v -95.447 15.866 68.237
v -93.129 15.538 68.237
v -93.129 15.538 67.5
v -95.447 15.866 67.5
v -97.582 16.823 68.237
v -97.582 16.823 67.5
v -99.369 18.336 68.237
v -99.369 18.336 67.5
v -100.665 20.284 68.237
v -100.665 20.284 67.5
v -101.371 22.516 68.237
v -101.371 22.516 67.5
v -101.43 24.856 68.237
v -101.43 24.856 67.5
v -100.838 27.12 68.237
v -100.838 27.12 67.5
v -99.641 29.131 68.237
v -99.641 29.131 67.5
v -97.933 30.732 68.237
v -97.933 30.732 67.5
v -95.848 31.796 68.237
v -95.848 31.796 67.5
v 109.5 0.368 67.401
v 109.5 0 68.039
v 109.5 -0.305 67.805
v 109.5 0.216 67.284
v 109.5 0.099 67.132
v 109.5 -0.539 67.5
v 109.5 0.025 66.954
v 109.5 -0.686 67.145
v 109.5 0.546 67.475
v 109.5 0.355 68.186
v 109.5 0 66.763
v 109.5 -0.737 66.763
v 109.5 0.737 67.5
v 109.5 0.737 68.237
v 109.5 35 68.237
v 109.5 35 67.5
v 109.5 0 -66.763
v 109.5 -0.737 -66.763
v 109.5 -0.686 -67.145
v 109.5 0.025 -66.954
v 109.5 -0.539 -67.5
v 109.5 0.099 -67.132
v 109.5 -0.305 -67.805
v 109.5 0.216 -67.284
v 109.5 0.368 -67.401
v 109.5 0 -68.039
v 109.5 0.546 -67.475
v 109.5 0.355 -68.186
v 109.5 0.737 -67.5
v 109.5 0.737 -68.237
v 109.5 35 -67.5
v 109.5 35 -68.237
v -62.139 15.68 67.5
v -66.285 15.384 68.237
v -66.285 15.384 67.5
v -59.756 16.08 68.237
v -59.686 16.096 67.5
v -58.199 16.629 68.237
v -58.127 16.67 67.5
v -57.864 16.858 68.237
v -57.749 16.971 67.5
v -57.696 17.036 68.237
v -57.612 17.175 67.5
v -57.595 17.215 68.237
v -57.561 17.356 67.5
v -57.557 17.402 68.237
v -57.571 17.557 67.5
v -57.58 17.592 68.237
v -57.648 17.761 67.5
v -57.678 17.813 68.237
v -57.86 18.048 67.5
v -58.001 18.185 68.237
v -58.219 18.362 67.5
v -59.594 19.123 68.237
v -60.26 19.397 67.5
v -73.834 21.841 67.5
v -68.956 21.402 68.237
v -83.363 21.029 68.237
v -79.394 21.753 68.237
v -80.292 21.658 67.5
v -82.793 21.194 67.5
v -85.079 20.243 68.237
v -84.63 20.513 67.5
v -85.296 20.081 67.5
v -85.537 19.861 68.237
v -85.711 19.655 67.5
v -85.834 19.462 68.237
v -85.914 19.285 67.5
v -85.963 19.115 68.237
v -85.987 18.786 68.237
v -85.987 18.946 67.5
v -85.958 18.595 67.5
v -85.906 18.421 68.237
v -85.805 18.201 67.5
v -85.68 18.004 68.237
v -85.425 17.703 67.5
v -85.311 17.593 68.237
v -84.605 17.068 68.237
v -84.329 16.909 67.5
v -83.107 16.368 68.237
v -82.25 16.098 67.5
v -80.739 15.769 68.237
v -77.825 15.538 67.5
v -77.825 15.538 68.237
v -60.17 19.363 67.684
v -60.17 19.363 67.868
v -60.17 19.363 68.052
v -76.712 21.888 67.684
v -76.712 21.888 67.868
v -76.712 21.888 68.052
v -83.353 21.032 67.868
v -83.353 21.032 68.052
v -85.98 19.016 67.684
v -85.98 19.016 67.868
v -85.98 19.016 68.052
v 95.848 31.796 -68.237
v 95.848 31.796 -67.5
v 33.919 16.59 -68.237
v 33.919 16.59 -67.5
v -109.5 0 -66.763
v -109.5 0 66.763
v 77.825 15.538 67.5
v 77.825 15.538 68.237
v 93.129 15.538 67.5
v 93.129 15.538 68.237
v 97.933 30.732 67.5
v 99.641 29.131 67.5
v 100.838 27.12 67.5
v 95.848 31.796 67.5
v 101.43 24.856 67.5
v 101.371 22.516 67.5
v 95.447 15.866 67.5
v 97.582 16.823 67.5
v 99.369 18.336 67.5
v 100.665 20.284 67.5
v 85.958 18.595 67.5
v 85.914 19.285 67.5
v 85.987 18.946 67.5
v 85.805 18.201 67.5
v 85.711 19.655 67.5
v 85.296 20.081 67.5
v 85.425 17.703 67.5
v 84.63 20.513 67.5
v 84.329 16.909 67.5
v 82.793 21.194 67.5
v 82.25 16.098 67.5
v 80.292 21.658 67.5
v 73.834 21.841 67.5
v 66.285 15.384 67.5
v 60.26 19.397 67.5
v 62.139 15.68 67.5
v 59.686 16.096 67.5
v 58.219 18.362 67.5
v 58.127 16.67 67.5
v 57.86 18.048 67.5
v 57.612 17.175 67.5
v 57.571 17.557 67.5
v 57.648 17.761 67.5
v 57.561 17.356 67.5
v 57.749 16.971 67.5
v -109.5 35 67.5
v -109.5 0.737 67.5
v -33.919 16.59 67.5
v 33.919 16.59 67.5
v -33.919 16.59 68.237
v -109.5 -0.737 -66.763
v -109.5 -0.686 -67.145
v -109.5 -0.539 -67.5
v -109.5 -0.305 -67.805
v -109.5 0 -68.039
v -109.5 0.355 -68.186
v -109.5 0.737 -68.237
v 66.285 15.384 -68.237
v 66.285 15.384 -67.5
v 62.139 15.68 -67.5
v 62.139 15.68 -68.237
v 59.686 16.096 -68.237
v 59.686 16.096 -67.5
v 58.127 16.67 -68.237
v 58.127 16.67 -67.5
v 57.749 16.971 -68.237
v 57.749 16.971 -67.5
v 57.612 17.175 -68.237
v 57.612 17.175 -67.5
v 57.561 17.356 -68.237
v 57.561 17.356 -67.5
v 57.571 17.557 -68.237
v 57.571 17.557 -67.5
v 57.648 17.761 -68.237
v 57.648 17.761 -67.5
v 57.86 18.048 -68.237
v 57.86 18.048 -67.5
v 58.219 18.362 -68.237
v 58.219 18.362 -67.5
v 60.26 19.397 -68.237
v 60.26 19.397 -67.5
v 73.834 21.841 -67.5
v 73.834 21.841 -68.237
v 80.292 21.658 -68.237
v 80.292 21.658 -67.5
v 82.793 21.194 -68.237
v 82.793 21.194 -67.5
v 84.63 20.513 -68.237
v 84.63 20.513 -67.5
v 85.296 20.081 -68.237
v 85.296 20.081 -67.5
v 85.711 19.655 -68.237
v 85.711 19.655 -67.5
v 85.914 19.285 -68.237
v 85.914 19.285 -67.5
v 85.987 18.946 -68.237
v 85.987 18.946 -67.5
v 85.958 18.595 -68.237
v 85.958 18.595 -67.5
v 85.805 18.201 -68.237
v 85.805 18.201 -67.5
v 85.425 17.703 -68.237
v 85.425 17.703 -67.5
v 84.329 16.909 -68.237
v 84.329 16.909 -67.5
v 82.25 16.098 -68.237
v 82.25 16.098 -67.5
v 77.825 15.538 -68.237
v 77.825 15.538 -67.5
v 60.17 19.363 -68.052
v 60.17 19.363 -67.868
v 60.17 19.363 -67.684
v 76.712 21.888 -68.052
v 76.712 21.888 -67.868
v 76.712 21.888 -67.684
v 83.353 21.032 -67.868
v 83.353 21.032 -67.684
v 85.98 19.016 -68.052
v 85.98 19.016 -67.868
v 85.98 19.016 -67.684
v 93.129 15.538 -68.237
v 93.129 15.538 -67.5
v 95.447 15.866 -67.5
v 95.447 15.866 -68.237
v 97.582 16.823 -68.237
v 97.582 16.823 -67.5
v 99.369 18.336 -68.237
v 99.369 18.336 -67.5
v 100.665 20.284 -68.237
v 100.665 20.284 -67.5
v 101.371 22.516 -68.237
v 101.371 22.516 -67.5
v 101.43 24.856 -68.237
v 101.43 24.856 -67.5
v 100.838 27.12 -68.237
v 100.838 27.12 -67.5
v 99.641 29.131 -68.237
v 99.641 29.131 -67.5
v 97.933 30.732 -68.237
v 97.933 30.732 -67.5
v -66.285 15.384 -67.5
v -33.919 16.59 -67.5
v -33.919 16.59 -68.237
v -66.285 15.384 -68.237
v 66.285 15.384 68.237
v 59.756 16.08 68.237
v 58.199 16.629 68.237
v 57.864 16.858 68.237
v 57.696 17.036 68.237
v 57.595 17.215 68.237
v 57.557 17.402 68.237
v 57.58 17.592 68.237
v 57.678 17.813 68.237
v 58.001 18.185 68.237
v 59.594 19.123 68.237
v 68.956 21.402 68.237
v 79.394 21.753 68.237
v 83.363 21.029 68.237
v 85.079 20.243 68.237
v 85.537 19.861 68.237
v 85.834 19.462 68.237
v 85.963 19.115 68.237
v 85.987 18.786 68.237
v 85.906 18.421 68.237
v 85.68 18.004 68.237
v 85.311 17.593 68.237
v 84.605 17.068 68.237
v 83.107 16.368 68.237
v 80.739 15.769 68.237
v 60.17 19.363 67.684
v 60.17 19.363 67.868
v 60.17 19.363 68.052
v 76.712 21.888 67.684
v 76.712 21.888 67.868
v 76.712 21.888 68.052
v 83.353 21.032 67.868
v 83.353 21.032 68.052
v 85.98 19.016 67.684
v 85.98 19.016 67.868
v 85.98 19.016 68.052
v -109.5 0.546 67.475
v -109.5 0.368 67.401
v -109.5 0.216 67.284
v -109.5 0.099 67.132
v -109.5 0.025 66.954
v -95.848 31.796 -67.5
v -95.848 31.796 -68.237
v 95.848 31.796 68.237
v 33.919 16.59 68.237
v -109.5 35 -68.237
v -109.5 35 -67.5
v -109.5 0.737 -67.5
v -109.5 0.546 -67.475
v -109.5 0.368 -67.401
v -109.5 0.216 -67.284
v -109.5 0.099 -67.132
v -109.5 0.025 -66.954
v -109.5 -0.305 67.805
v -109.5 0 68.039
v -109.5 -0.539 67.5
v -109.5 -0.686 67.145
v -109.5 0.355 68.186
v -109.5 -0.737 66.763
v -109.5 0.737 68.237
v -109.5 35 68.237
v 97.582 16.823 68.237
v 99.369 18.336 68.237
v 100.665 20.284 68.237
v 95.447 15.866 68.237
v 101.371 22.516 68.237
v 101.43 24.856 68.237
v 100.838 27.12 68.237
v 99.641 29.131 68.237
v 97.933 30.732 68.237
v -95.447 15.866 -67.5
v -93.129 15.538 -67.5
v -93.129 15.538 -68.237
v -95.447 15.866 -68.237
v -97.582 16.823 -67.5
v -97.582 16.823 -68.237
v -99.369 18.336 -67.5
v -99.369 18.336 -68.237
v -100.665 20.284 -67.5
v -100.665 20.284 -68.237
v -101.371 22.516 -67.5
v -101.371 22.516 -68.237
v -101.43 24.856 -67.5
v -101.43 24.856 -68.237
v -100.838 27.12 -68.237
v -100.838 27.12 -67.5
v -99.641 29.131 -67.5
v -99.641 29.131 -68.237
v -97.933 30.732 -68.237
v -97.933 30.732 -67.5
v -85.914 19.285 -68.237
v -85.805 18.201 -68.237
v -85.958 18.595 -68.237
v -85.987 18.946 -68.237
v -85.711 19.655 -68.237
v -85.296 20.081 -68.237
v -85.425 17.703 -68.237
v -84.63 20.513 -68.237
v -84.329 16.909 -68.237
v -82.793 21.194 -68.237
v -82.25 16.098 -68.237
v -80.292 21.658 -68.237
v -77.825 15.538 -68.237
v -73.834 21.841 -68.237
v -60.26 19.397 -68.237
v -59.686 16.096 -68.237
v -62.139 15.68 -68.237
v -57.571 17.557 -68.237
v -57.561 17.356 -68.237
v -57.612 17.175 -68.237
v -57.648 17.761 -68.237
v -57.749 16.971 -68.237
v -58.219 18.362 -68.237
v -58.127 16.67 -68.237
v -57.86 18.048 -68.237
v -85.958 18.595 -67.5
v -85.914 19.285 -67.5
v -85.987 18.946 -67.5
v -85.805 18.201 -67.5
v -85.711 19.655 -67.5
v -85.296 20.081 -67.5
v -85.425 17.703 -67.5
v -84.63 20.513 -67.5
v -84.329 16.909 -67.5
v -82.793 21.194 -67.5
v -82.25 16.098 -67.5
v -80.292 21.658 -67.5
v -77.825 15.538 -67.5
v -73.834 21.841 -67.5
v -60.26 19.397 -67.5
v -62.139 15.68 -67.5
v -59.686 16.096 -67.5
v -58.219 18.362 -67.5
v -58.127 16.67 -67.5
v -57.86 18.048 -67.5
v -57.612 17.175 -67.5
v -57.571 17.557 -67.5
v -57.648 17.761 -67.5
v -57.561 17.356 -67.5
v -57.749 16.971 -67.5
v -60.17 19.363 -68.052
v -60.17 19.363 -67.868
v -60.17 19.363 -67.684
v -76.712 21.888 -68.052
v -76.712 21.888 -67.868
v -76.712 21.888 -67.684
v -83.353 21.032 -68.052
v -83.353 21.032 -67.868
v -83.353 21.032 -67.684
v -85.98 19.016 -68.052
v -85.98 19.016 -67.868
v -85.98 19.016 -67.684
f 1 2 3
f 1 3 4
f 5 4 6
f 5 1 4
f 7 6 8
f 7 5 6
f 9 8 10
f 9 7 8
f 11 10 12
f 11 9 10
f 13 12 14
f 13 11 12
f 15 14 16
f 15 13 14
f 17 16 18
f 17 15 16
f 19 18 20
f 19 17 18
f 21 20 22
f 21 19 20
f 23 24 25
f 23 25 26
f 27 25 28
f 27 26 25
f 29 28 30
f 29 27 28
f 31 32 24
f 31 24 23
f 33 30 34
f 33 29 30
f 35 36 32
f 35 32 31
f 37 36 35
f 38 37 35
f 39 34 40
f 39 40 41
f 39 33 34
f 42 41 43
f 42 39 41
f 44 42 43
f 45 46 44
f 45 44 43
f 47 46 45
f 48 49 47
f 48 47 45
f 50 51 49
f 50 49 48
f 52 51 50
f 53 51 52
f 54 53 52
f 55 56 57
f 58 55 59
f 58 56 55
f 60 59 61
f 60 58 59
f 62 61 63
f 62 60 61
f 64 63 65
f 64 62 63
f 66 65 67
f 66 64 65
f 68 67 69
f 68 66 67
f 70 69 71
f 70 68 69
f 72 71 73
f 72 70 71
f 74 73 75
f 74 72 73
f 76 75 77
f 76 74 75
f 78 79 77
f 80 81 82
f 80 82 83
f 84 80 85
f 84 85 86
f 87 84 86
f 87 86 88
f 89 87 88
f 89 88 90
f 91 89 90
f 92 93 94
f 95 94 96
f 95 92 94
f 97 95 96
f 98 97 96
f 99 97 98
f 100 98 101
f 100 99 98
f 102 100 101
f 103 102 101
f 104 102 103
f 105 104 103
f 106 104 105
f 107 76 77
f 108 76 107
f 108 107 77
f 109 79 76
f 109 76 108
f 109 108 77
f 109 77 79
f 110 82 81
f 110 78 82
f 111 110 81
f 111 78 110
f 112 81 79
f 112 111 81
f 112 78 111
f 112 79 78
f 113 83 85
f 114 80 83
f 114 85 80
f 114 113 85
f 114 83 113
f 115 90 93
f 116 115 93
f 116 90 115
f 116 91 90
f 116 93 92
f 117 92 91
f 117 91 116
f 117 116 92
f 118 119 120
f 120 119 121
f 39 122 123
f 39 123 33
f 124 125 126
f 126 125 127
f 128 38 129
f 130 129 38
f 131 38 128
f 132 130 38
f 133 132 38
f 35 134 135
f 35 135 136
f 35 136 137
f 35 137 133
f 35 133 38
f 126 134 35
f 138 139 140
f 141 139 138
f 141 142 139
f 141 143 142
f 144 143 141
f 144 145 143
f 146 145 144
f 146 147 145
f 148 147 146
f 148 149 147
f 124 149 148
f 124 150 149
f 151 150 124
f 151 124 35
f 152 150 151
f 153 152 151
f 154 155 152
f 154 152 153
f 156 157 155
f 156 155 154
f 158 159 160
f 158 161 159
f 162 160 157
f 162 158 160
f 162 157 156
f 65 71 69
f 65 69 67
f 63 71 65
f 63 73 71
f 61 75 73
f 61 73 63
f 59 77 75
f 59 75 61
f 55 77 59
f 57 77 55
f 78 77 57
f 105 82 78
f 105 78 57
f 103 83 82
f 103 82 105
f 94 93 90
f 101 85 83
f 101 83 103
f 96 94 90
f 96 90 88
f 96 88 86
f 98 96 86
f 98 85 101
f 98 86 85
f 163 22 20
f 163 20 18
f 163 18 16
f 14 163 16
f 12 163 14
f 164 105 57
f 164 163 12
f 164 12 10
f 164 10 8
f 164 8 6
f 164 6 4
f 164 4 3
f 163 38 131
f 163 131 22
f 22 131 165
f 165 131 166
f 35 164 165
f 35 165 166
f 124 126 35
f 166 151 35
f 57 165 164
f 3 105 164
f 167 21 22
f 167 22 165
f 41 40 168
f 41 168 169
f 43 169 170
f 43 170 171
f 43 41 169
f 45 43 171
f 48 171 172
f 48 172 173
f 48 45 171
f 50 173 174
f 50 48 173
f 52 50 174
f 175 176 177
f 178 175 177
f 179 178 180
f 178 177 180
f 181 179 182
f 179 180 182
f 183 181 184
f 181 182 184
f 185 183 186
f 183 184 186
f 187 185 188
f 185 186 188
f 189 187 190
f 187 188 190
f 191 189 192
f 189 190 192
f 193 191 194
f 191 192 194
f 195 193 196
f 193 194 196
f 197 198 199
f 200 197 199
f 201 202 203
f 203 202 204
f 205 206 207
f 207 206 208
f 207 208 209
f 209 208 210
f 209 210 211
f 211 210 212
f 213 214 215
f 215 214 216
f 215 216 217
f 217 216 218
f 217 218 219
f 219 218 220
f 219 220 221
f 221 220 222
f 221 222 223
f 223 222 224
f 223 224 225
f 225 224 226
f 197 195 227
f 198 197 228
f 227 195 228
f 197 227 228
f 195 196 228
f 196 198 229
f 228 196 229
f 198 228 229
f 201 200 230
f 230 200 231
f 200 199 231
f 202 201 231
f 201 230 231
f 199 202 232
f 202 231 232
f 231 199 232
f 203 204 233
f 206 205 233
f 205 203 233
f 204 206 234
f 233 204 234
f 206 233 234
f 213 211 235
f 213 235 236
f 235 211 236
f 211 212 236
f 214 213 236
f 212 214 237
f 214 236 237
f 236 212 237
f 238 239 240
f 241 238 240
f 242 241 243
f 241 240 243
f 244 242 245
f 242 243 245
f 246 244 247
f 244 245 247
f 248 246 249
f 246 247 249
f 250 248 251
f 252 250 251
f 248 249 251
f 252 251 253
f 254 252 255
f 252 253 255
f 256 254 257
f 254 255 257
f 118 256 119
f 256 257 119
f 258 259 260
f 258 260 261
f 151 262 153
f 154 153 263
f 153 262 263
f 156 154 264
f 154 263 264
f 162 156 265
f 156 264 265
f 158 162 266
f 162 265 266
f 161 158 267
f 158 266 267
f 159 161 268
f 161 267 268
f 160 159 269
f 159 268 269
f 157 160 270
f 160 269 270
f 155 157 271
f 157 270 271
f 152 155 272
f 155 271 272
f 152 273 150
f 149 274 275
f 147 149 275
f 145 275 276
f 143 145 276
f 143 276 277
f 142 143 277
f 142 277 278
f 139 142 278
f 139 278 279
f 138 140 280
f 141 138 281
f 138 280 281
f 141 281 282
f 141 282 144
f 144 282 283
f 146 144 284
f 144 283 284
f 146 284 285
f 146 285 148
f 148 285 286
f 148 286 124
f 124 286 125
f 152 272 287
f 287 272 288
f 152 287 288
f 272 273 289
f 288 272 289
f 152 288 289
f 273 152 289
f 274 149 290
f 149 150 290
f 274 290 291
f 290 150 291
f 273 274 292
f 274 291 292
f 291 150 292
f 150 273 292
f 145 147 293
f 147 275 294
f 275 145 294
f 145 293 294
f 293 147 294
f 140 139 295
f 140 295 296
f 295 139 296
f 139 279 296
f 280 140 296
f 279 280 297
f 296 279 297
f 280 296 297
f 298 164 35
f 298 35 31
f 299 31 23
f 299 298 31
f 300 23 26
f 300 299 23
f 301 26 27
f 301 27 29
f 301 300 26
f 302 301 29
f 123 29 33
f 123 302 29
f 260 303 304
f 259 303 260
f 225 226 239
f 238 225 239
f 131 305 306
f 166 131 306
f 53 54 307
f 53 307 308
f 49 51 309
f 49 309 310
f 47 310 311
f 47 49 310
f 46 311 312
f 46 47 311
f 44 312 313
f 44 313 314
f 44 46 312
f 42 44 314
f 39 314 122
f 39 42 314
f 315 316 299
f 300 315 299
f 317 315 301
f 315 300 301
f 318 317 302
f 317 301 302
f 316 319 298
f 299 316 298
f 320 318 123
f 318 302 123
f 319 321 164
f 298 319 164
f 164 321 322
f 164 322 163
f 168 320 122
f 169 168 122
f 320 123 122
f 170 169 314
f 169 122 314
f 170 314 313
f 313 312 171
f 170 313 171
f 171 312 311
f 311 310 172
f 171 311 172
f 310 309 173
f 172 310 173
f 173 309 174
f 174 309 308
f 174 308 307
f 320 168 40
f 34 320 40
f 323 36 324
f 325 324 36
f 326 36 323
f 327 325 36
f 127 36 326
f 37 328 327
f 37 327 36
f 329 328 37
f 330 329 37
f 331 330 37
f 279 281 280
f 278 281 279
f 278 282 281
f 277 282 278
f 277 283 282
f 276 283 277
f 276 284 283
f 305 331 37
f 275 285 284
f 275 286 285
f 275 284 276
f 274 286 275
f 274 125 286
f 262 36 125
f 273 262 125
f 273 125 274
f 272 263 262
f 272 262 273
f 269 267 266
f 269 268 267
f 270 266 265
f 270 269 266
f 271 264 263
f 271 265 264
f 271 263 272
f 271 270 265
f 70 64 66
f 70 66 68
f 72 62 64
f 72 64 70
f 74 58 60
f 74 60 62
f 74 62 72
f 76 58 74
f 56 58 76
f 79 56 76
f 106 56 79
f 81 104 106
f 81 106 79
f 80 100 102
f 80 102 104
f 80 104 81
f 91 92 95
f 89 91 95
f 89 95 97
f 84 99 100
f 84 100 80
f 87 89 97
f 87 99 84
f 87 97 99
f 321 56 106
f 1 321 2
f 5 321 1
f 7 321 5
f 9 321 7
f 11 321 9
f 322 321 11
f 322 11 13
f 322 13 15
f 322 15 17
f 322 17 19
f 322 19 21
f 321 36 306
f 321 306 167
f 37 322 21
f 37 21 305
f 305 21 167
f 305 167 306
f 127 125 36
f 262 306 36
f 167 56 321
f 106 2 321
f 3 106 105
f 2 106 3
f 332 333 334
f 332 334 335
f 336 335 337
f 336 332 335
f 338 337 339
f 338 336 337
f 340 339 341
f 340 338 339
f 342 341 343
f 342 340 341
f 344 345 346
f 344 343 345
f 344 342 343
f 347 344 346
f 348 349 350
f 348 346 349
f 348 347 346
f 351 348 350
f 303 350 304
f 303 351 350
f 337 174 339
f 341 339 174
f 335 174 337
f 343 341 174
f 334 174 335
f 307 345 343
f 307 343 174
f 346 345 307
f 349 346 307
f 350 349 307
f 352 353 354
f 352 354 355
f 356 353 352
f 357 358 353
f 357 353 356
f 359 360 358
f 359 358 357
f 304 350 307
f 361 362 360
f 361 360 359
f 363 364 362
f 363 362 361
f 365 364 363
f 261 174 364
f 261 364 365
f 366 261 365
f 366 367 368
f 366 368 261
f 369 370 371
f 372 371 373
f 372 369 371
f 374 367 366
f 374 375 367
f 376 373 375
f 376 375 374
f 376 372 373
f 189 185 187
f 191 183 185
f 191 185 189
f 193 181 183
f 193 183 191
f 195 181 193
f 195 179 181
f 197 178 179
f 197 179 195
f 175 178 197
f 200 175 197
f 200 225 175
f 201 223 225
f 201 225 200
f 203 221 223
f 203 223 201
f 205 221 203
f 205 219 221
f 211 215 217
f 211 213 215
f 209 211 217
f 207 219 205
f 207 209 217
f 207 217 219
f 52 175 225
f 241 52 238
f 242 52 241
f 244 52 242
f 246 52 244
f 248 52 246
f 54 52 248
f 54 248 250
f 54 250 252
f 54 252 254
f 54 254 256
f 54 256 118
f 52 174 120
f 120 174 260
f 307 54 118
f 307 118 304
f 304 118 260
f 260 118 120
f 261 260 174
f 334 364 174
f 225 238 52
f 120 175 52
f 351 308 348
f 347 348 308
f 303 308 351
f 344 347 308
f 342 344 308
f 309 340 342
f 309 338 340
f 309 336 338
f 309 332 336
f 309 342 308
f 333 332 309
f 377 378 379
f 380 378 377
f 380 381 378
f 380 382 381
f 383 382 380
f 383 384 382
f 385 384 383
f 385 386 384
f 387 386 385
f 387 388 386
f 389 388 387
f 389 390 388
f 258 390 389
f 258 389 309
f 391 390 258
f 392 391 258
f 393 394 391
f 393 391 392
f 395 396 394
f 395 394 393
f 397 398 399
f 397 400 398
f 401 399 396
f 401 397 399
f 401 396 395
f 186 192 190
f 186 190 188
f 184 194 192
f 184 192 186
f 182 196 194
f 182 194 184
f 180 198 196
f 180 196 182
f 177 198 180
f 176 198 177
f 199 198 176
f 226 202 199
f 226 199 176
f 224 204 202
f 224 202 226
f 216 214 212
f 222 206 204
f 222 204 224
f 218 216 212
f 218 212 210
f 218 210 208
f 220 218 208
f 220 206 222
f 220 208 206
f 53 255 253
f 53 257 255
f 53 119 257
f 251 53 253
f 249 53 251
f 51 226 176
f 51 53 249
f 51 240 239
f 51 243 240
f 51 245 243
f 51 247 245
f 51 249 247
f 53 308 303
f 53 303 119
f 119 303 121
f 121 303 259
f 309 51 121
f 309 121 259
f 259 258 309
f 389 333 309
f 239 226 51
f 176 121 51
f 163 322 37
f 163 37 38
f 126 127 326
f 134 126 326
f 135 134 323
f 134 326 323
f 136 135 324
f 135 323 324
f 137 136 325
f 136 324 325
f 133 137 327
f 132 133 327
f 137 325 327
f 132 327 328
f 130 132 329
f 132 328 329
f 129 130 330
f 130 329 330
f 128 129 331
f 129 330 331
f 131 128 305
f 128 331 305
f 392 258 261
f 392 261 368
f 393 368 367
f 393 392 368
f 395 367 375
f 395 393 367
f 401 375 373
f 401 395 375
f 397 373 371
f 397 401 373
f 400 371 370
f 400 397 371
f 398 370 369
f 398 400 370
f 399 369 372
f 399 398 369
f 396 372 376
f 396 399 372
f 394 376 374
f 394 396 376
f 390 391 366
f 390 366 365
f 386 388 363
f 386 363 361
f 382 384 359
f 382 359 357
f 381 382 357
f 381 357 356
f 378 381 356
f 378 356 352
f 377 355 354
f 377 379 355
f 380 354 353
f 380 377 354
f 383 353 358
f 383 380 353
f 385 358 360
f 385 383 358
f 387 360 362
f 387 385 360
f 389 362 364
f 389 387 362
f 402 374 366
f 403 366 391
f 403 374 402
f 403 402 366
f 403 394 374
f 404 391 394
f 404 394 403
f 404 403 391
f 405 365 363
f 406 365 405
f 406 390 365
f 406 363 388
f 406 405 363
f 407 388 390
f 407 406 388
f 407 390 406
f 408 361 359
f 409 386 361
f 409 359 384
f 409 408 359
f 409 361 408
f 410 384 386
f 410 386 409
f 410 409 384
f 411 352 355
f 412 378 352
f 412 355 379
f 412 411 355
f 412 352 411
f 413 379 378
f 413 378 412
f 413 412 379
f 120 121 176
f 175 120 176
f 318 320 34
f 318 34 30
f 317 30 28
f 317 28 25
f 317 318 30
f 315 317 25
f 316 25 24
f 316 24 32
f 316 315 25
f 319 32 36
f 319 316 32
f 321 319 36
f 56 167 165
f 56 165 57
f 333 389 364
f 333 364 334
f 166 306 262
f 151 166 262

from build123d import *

# Parameters (mm, degrees)
SKETCH1_W                      = 219
SKETCH1_H                      = 135
BASE_FLANGE1_DEPTH             = 0.7366
EDGE_FLANGE1_STRIP_W           = 4.4196
EDGE_FLANGE1_STRIP_H           = 0.7366
EDGE_FLANGE1_STRIP_CUT_DEPTH   = 219
EDGE_FLANGE1_STRIP_2_W         = 4.4196
EDGE_FLANGE1_STRIP_2_H         = 0.7366
EDGE_FLANGE1_STRIP_CUT_2_DEPTH = 219
EDGE_FLANGE1_DEPTH             = 219
EDGE_FLANGE1_BEND_DEPTH        = 219
CUT_EXTRUDE1_DEPTH             = 179.438180663


# Sheet-metal steps are written as plain solids
with BuildPart() as part:
    # Sketch1 → Base-Flange1 (new body)
    with BuildSketch(Plane(origin=(0, 0, 0), x_dir=(1, 0, 0), z_dir=(0, 1, 0))):
        Rectangle(SKETCH1_W, SKETCH1_H)
    extrude(amount=-BASE_FLANGE1_DEPTH)

    # Edge-Flange1 strip (across the edge) → Edge-Flange1 strip cut (cut)
    with BuildSketch(Plane(origin=(-109.5, 0, 67.5), x_dir=(0, 0, -1), z_dir=(1, 0, 0))):
        with Locations((-1.4732, -0.3683)):
            Rectangle(EDGE_FLANGE1_STRIP_W, EDGE_FLANGE1_STRIP_H)
    extrude(amount=EDGE_FLANGE1_STRIP_CUT_DEPTH, mode=Mode.SUBTRACT)

    # Edge-Flange1 strip 2 (across the edge) → Edge-Flange1 strip cut 2 (cut)
    with BuildSketch(Plane(origin=(109.5, 0, -67.5), x_dir=(0, 0, 1), z_dir=(-1, 0, 0))):
        with Locations((-1.4732, -0.3683)):
            Rectangle(EDGE_FLANGE1_STRIP_2_W, EDGE_FLANGE1_STRIP_2_H)
    extrude(amount=EDGE_FLANGE1_STRIP_CUT_2_DEPTH, mode=Mode.SUBTRACT)

    # Edge-Flange1 section (across the edge) → Edge-Flange1 (add)
    with BuildSketch(Plane(origin=(-109.5, 0, 67.5), x_dir=(0, 0, -1), z_dir=(1, 0, 0))):
        with BuildLine():
            Line((-0.7366, 0.7366), (-0.7366, 35))
            Line((-0.7366, 35), (0, 35))
            Line((0, 35), (0, 0.7366))
            ThreePointArc((0, 0.7366), (0.215745145, 0.215745145), (0.7366, 0))
            Line((0.7366, 0), (0.7366, -0.7366))
            ThreePointArc((0.7366, -0.7366), (-0.30510971, -0.30510971), (-0.7366, 0.7366))
        make_face()
    extrude(amount=EDGE_FLANGE1_DEPTH)

    # Edge-Flange1 section 2 (across the edge) → Edge-Flange1 bend (add)
    with BuildSketch(Plane(origin=(109.5, 0, -67.5), x_dir=(0, 0, 1), z_dir=(-1, 0, 0))):
        with BuildLine():
            Line((-0.7366, 0.7366), (-0.7366, 35))
            Line((-0.7366, 35), (0, 35))
            Line((0, 35), (0, 0.7366))
            ThreePointArc((0, 0.7366), (0.215745145, 0.215745145), (0.7366, 0))
            Line((0.7366, 0), (0.7366, -0.7366))
            ThreePointArc((0.7366, -0.7366), (-0.30510971, -0.30510971), (-0.7366, 0.7366))
        make_face()
    extrude(amount=EDGE_FLANGE1_BEND_DEPTH)

    # Sketch13 → Cut-Extrude1 (cut, through all)
    with BuildSketch(Plane.XY.offset(68.2366)):
        with BuildLine():
            Line((77.825189915, 15.538033098), (93.129236627, 15.538033098))
            ThreePointArc((93.129236627, 15.538033098), (101.370995393, 22.515880602), (95.848230578, 31.795751945))
            Line((95.848230578, 31.795751945), (33.918811085, 16.589807391))
            Line((33.918811085, 16.589807391), (66.285317903, 15.384418636))
            add(Edge.make_bspline(
                [(66.285317903, 15.384418636), (33.918811085, 16.589807391), (95.848230578, 31.795751945), (93.129236627, 15.538033098), (77.825189915, 15.538033098)],
                knots=[0, 0, 0, 0, 0, 1, 1, 1, 1, 1], degree=4))
        make_face()
        with BuildLine():
            Line((-95.848230578, 31.795751945), (-33.918811085, 16.589807391))
            Line((-33.918811085, 16.589807391), (-66.285317903, 15.384418636))
            add(Edge.make_bspline(
                [(-66.285317903, 15.384418636), (-33.918811085, 16.589807391), (-95.848230578, 31.795751945), (-93.129236627, 15.538033098), (-77.825189915, 15.538033098)],
                knots=[0, 0, 0, 0, 0, 1, 1, 1, 1, 1], degree=4))
            Line((-77.825189915, 15.538033098), (-93.129236627, 15.538033098))
            ThreePointArc((-93.129236627, 15.538033098), (-101.370995393, 22.515880602), (-95.848230578, 31.795751945))
        make_face()
    extrude(amount=-CUT_EXTRUDE1_DEPTH, mode=Mode.SUBTRACT)


solid = part.part
